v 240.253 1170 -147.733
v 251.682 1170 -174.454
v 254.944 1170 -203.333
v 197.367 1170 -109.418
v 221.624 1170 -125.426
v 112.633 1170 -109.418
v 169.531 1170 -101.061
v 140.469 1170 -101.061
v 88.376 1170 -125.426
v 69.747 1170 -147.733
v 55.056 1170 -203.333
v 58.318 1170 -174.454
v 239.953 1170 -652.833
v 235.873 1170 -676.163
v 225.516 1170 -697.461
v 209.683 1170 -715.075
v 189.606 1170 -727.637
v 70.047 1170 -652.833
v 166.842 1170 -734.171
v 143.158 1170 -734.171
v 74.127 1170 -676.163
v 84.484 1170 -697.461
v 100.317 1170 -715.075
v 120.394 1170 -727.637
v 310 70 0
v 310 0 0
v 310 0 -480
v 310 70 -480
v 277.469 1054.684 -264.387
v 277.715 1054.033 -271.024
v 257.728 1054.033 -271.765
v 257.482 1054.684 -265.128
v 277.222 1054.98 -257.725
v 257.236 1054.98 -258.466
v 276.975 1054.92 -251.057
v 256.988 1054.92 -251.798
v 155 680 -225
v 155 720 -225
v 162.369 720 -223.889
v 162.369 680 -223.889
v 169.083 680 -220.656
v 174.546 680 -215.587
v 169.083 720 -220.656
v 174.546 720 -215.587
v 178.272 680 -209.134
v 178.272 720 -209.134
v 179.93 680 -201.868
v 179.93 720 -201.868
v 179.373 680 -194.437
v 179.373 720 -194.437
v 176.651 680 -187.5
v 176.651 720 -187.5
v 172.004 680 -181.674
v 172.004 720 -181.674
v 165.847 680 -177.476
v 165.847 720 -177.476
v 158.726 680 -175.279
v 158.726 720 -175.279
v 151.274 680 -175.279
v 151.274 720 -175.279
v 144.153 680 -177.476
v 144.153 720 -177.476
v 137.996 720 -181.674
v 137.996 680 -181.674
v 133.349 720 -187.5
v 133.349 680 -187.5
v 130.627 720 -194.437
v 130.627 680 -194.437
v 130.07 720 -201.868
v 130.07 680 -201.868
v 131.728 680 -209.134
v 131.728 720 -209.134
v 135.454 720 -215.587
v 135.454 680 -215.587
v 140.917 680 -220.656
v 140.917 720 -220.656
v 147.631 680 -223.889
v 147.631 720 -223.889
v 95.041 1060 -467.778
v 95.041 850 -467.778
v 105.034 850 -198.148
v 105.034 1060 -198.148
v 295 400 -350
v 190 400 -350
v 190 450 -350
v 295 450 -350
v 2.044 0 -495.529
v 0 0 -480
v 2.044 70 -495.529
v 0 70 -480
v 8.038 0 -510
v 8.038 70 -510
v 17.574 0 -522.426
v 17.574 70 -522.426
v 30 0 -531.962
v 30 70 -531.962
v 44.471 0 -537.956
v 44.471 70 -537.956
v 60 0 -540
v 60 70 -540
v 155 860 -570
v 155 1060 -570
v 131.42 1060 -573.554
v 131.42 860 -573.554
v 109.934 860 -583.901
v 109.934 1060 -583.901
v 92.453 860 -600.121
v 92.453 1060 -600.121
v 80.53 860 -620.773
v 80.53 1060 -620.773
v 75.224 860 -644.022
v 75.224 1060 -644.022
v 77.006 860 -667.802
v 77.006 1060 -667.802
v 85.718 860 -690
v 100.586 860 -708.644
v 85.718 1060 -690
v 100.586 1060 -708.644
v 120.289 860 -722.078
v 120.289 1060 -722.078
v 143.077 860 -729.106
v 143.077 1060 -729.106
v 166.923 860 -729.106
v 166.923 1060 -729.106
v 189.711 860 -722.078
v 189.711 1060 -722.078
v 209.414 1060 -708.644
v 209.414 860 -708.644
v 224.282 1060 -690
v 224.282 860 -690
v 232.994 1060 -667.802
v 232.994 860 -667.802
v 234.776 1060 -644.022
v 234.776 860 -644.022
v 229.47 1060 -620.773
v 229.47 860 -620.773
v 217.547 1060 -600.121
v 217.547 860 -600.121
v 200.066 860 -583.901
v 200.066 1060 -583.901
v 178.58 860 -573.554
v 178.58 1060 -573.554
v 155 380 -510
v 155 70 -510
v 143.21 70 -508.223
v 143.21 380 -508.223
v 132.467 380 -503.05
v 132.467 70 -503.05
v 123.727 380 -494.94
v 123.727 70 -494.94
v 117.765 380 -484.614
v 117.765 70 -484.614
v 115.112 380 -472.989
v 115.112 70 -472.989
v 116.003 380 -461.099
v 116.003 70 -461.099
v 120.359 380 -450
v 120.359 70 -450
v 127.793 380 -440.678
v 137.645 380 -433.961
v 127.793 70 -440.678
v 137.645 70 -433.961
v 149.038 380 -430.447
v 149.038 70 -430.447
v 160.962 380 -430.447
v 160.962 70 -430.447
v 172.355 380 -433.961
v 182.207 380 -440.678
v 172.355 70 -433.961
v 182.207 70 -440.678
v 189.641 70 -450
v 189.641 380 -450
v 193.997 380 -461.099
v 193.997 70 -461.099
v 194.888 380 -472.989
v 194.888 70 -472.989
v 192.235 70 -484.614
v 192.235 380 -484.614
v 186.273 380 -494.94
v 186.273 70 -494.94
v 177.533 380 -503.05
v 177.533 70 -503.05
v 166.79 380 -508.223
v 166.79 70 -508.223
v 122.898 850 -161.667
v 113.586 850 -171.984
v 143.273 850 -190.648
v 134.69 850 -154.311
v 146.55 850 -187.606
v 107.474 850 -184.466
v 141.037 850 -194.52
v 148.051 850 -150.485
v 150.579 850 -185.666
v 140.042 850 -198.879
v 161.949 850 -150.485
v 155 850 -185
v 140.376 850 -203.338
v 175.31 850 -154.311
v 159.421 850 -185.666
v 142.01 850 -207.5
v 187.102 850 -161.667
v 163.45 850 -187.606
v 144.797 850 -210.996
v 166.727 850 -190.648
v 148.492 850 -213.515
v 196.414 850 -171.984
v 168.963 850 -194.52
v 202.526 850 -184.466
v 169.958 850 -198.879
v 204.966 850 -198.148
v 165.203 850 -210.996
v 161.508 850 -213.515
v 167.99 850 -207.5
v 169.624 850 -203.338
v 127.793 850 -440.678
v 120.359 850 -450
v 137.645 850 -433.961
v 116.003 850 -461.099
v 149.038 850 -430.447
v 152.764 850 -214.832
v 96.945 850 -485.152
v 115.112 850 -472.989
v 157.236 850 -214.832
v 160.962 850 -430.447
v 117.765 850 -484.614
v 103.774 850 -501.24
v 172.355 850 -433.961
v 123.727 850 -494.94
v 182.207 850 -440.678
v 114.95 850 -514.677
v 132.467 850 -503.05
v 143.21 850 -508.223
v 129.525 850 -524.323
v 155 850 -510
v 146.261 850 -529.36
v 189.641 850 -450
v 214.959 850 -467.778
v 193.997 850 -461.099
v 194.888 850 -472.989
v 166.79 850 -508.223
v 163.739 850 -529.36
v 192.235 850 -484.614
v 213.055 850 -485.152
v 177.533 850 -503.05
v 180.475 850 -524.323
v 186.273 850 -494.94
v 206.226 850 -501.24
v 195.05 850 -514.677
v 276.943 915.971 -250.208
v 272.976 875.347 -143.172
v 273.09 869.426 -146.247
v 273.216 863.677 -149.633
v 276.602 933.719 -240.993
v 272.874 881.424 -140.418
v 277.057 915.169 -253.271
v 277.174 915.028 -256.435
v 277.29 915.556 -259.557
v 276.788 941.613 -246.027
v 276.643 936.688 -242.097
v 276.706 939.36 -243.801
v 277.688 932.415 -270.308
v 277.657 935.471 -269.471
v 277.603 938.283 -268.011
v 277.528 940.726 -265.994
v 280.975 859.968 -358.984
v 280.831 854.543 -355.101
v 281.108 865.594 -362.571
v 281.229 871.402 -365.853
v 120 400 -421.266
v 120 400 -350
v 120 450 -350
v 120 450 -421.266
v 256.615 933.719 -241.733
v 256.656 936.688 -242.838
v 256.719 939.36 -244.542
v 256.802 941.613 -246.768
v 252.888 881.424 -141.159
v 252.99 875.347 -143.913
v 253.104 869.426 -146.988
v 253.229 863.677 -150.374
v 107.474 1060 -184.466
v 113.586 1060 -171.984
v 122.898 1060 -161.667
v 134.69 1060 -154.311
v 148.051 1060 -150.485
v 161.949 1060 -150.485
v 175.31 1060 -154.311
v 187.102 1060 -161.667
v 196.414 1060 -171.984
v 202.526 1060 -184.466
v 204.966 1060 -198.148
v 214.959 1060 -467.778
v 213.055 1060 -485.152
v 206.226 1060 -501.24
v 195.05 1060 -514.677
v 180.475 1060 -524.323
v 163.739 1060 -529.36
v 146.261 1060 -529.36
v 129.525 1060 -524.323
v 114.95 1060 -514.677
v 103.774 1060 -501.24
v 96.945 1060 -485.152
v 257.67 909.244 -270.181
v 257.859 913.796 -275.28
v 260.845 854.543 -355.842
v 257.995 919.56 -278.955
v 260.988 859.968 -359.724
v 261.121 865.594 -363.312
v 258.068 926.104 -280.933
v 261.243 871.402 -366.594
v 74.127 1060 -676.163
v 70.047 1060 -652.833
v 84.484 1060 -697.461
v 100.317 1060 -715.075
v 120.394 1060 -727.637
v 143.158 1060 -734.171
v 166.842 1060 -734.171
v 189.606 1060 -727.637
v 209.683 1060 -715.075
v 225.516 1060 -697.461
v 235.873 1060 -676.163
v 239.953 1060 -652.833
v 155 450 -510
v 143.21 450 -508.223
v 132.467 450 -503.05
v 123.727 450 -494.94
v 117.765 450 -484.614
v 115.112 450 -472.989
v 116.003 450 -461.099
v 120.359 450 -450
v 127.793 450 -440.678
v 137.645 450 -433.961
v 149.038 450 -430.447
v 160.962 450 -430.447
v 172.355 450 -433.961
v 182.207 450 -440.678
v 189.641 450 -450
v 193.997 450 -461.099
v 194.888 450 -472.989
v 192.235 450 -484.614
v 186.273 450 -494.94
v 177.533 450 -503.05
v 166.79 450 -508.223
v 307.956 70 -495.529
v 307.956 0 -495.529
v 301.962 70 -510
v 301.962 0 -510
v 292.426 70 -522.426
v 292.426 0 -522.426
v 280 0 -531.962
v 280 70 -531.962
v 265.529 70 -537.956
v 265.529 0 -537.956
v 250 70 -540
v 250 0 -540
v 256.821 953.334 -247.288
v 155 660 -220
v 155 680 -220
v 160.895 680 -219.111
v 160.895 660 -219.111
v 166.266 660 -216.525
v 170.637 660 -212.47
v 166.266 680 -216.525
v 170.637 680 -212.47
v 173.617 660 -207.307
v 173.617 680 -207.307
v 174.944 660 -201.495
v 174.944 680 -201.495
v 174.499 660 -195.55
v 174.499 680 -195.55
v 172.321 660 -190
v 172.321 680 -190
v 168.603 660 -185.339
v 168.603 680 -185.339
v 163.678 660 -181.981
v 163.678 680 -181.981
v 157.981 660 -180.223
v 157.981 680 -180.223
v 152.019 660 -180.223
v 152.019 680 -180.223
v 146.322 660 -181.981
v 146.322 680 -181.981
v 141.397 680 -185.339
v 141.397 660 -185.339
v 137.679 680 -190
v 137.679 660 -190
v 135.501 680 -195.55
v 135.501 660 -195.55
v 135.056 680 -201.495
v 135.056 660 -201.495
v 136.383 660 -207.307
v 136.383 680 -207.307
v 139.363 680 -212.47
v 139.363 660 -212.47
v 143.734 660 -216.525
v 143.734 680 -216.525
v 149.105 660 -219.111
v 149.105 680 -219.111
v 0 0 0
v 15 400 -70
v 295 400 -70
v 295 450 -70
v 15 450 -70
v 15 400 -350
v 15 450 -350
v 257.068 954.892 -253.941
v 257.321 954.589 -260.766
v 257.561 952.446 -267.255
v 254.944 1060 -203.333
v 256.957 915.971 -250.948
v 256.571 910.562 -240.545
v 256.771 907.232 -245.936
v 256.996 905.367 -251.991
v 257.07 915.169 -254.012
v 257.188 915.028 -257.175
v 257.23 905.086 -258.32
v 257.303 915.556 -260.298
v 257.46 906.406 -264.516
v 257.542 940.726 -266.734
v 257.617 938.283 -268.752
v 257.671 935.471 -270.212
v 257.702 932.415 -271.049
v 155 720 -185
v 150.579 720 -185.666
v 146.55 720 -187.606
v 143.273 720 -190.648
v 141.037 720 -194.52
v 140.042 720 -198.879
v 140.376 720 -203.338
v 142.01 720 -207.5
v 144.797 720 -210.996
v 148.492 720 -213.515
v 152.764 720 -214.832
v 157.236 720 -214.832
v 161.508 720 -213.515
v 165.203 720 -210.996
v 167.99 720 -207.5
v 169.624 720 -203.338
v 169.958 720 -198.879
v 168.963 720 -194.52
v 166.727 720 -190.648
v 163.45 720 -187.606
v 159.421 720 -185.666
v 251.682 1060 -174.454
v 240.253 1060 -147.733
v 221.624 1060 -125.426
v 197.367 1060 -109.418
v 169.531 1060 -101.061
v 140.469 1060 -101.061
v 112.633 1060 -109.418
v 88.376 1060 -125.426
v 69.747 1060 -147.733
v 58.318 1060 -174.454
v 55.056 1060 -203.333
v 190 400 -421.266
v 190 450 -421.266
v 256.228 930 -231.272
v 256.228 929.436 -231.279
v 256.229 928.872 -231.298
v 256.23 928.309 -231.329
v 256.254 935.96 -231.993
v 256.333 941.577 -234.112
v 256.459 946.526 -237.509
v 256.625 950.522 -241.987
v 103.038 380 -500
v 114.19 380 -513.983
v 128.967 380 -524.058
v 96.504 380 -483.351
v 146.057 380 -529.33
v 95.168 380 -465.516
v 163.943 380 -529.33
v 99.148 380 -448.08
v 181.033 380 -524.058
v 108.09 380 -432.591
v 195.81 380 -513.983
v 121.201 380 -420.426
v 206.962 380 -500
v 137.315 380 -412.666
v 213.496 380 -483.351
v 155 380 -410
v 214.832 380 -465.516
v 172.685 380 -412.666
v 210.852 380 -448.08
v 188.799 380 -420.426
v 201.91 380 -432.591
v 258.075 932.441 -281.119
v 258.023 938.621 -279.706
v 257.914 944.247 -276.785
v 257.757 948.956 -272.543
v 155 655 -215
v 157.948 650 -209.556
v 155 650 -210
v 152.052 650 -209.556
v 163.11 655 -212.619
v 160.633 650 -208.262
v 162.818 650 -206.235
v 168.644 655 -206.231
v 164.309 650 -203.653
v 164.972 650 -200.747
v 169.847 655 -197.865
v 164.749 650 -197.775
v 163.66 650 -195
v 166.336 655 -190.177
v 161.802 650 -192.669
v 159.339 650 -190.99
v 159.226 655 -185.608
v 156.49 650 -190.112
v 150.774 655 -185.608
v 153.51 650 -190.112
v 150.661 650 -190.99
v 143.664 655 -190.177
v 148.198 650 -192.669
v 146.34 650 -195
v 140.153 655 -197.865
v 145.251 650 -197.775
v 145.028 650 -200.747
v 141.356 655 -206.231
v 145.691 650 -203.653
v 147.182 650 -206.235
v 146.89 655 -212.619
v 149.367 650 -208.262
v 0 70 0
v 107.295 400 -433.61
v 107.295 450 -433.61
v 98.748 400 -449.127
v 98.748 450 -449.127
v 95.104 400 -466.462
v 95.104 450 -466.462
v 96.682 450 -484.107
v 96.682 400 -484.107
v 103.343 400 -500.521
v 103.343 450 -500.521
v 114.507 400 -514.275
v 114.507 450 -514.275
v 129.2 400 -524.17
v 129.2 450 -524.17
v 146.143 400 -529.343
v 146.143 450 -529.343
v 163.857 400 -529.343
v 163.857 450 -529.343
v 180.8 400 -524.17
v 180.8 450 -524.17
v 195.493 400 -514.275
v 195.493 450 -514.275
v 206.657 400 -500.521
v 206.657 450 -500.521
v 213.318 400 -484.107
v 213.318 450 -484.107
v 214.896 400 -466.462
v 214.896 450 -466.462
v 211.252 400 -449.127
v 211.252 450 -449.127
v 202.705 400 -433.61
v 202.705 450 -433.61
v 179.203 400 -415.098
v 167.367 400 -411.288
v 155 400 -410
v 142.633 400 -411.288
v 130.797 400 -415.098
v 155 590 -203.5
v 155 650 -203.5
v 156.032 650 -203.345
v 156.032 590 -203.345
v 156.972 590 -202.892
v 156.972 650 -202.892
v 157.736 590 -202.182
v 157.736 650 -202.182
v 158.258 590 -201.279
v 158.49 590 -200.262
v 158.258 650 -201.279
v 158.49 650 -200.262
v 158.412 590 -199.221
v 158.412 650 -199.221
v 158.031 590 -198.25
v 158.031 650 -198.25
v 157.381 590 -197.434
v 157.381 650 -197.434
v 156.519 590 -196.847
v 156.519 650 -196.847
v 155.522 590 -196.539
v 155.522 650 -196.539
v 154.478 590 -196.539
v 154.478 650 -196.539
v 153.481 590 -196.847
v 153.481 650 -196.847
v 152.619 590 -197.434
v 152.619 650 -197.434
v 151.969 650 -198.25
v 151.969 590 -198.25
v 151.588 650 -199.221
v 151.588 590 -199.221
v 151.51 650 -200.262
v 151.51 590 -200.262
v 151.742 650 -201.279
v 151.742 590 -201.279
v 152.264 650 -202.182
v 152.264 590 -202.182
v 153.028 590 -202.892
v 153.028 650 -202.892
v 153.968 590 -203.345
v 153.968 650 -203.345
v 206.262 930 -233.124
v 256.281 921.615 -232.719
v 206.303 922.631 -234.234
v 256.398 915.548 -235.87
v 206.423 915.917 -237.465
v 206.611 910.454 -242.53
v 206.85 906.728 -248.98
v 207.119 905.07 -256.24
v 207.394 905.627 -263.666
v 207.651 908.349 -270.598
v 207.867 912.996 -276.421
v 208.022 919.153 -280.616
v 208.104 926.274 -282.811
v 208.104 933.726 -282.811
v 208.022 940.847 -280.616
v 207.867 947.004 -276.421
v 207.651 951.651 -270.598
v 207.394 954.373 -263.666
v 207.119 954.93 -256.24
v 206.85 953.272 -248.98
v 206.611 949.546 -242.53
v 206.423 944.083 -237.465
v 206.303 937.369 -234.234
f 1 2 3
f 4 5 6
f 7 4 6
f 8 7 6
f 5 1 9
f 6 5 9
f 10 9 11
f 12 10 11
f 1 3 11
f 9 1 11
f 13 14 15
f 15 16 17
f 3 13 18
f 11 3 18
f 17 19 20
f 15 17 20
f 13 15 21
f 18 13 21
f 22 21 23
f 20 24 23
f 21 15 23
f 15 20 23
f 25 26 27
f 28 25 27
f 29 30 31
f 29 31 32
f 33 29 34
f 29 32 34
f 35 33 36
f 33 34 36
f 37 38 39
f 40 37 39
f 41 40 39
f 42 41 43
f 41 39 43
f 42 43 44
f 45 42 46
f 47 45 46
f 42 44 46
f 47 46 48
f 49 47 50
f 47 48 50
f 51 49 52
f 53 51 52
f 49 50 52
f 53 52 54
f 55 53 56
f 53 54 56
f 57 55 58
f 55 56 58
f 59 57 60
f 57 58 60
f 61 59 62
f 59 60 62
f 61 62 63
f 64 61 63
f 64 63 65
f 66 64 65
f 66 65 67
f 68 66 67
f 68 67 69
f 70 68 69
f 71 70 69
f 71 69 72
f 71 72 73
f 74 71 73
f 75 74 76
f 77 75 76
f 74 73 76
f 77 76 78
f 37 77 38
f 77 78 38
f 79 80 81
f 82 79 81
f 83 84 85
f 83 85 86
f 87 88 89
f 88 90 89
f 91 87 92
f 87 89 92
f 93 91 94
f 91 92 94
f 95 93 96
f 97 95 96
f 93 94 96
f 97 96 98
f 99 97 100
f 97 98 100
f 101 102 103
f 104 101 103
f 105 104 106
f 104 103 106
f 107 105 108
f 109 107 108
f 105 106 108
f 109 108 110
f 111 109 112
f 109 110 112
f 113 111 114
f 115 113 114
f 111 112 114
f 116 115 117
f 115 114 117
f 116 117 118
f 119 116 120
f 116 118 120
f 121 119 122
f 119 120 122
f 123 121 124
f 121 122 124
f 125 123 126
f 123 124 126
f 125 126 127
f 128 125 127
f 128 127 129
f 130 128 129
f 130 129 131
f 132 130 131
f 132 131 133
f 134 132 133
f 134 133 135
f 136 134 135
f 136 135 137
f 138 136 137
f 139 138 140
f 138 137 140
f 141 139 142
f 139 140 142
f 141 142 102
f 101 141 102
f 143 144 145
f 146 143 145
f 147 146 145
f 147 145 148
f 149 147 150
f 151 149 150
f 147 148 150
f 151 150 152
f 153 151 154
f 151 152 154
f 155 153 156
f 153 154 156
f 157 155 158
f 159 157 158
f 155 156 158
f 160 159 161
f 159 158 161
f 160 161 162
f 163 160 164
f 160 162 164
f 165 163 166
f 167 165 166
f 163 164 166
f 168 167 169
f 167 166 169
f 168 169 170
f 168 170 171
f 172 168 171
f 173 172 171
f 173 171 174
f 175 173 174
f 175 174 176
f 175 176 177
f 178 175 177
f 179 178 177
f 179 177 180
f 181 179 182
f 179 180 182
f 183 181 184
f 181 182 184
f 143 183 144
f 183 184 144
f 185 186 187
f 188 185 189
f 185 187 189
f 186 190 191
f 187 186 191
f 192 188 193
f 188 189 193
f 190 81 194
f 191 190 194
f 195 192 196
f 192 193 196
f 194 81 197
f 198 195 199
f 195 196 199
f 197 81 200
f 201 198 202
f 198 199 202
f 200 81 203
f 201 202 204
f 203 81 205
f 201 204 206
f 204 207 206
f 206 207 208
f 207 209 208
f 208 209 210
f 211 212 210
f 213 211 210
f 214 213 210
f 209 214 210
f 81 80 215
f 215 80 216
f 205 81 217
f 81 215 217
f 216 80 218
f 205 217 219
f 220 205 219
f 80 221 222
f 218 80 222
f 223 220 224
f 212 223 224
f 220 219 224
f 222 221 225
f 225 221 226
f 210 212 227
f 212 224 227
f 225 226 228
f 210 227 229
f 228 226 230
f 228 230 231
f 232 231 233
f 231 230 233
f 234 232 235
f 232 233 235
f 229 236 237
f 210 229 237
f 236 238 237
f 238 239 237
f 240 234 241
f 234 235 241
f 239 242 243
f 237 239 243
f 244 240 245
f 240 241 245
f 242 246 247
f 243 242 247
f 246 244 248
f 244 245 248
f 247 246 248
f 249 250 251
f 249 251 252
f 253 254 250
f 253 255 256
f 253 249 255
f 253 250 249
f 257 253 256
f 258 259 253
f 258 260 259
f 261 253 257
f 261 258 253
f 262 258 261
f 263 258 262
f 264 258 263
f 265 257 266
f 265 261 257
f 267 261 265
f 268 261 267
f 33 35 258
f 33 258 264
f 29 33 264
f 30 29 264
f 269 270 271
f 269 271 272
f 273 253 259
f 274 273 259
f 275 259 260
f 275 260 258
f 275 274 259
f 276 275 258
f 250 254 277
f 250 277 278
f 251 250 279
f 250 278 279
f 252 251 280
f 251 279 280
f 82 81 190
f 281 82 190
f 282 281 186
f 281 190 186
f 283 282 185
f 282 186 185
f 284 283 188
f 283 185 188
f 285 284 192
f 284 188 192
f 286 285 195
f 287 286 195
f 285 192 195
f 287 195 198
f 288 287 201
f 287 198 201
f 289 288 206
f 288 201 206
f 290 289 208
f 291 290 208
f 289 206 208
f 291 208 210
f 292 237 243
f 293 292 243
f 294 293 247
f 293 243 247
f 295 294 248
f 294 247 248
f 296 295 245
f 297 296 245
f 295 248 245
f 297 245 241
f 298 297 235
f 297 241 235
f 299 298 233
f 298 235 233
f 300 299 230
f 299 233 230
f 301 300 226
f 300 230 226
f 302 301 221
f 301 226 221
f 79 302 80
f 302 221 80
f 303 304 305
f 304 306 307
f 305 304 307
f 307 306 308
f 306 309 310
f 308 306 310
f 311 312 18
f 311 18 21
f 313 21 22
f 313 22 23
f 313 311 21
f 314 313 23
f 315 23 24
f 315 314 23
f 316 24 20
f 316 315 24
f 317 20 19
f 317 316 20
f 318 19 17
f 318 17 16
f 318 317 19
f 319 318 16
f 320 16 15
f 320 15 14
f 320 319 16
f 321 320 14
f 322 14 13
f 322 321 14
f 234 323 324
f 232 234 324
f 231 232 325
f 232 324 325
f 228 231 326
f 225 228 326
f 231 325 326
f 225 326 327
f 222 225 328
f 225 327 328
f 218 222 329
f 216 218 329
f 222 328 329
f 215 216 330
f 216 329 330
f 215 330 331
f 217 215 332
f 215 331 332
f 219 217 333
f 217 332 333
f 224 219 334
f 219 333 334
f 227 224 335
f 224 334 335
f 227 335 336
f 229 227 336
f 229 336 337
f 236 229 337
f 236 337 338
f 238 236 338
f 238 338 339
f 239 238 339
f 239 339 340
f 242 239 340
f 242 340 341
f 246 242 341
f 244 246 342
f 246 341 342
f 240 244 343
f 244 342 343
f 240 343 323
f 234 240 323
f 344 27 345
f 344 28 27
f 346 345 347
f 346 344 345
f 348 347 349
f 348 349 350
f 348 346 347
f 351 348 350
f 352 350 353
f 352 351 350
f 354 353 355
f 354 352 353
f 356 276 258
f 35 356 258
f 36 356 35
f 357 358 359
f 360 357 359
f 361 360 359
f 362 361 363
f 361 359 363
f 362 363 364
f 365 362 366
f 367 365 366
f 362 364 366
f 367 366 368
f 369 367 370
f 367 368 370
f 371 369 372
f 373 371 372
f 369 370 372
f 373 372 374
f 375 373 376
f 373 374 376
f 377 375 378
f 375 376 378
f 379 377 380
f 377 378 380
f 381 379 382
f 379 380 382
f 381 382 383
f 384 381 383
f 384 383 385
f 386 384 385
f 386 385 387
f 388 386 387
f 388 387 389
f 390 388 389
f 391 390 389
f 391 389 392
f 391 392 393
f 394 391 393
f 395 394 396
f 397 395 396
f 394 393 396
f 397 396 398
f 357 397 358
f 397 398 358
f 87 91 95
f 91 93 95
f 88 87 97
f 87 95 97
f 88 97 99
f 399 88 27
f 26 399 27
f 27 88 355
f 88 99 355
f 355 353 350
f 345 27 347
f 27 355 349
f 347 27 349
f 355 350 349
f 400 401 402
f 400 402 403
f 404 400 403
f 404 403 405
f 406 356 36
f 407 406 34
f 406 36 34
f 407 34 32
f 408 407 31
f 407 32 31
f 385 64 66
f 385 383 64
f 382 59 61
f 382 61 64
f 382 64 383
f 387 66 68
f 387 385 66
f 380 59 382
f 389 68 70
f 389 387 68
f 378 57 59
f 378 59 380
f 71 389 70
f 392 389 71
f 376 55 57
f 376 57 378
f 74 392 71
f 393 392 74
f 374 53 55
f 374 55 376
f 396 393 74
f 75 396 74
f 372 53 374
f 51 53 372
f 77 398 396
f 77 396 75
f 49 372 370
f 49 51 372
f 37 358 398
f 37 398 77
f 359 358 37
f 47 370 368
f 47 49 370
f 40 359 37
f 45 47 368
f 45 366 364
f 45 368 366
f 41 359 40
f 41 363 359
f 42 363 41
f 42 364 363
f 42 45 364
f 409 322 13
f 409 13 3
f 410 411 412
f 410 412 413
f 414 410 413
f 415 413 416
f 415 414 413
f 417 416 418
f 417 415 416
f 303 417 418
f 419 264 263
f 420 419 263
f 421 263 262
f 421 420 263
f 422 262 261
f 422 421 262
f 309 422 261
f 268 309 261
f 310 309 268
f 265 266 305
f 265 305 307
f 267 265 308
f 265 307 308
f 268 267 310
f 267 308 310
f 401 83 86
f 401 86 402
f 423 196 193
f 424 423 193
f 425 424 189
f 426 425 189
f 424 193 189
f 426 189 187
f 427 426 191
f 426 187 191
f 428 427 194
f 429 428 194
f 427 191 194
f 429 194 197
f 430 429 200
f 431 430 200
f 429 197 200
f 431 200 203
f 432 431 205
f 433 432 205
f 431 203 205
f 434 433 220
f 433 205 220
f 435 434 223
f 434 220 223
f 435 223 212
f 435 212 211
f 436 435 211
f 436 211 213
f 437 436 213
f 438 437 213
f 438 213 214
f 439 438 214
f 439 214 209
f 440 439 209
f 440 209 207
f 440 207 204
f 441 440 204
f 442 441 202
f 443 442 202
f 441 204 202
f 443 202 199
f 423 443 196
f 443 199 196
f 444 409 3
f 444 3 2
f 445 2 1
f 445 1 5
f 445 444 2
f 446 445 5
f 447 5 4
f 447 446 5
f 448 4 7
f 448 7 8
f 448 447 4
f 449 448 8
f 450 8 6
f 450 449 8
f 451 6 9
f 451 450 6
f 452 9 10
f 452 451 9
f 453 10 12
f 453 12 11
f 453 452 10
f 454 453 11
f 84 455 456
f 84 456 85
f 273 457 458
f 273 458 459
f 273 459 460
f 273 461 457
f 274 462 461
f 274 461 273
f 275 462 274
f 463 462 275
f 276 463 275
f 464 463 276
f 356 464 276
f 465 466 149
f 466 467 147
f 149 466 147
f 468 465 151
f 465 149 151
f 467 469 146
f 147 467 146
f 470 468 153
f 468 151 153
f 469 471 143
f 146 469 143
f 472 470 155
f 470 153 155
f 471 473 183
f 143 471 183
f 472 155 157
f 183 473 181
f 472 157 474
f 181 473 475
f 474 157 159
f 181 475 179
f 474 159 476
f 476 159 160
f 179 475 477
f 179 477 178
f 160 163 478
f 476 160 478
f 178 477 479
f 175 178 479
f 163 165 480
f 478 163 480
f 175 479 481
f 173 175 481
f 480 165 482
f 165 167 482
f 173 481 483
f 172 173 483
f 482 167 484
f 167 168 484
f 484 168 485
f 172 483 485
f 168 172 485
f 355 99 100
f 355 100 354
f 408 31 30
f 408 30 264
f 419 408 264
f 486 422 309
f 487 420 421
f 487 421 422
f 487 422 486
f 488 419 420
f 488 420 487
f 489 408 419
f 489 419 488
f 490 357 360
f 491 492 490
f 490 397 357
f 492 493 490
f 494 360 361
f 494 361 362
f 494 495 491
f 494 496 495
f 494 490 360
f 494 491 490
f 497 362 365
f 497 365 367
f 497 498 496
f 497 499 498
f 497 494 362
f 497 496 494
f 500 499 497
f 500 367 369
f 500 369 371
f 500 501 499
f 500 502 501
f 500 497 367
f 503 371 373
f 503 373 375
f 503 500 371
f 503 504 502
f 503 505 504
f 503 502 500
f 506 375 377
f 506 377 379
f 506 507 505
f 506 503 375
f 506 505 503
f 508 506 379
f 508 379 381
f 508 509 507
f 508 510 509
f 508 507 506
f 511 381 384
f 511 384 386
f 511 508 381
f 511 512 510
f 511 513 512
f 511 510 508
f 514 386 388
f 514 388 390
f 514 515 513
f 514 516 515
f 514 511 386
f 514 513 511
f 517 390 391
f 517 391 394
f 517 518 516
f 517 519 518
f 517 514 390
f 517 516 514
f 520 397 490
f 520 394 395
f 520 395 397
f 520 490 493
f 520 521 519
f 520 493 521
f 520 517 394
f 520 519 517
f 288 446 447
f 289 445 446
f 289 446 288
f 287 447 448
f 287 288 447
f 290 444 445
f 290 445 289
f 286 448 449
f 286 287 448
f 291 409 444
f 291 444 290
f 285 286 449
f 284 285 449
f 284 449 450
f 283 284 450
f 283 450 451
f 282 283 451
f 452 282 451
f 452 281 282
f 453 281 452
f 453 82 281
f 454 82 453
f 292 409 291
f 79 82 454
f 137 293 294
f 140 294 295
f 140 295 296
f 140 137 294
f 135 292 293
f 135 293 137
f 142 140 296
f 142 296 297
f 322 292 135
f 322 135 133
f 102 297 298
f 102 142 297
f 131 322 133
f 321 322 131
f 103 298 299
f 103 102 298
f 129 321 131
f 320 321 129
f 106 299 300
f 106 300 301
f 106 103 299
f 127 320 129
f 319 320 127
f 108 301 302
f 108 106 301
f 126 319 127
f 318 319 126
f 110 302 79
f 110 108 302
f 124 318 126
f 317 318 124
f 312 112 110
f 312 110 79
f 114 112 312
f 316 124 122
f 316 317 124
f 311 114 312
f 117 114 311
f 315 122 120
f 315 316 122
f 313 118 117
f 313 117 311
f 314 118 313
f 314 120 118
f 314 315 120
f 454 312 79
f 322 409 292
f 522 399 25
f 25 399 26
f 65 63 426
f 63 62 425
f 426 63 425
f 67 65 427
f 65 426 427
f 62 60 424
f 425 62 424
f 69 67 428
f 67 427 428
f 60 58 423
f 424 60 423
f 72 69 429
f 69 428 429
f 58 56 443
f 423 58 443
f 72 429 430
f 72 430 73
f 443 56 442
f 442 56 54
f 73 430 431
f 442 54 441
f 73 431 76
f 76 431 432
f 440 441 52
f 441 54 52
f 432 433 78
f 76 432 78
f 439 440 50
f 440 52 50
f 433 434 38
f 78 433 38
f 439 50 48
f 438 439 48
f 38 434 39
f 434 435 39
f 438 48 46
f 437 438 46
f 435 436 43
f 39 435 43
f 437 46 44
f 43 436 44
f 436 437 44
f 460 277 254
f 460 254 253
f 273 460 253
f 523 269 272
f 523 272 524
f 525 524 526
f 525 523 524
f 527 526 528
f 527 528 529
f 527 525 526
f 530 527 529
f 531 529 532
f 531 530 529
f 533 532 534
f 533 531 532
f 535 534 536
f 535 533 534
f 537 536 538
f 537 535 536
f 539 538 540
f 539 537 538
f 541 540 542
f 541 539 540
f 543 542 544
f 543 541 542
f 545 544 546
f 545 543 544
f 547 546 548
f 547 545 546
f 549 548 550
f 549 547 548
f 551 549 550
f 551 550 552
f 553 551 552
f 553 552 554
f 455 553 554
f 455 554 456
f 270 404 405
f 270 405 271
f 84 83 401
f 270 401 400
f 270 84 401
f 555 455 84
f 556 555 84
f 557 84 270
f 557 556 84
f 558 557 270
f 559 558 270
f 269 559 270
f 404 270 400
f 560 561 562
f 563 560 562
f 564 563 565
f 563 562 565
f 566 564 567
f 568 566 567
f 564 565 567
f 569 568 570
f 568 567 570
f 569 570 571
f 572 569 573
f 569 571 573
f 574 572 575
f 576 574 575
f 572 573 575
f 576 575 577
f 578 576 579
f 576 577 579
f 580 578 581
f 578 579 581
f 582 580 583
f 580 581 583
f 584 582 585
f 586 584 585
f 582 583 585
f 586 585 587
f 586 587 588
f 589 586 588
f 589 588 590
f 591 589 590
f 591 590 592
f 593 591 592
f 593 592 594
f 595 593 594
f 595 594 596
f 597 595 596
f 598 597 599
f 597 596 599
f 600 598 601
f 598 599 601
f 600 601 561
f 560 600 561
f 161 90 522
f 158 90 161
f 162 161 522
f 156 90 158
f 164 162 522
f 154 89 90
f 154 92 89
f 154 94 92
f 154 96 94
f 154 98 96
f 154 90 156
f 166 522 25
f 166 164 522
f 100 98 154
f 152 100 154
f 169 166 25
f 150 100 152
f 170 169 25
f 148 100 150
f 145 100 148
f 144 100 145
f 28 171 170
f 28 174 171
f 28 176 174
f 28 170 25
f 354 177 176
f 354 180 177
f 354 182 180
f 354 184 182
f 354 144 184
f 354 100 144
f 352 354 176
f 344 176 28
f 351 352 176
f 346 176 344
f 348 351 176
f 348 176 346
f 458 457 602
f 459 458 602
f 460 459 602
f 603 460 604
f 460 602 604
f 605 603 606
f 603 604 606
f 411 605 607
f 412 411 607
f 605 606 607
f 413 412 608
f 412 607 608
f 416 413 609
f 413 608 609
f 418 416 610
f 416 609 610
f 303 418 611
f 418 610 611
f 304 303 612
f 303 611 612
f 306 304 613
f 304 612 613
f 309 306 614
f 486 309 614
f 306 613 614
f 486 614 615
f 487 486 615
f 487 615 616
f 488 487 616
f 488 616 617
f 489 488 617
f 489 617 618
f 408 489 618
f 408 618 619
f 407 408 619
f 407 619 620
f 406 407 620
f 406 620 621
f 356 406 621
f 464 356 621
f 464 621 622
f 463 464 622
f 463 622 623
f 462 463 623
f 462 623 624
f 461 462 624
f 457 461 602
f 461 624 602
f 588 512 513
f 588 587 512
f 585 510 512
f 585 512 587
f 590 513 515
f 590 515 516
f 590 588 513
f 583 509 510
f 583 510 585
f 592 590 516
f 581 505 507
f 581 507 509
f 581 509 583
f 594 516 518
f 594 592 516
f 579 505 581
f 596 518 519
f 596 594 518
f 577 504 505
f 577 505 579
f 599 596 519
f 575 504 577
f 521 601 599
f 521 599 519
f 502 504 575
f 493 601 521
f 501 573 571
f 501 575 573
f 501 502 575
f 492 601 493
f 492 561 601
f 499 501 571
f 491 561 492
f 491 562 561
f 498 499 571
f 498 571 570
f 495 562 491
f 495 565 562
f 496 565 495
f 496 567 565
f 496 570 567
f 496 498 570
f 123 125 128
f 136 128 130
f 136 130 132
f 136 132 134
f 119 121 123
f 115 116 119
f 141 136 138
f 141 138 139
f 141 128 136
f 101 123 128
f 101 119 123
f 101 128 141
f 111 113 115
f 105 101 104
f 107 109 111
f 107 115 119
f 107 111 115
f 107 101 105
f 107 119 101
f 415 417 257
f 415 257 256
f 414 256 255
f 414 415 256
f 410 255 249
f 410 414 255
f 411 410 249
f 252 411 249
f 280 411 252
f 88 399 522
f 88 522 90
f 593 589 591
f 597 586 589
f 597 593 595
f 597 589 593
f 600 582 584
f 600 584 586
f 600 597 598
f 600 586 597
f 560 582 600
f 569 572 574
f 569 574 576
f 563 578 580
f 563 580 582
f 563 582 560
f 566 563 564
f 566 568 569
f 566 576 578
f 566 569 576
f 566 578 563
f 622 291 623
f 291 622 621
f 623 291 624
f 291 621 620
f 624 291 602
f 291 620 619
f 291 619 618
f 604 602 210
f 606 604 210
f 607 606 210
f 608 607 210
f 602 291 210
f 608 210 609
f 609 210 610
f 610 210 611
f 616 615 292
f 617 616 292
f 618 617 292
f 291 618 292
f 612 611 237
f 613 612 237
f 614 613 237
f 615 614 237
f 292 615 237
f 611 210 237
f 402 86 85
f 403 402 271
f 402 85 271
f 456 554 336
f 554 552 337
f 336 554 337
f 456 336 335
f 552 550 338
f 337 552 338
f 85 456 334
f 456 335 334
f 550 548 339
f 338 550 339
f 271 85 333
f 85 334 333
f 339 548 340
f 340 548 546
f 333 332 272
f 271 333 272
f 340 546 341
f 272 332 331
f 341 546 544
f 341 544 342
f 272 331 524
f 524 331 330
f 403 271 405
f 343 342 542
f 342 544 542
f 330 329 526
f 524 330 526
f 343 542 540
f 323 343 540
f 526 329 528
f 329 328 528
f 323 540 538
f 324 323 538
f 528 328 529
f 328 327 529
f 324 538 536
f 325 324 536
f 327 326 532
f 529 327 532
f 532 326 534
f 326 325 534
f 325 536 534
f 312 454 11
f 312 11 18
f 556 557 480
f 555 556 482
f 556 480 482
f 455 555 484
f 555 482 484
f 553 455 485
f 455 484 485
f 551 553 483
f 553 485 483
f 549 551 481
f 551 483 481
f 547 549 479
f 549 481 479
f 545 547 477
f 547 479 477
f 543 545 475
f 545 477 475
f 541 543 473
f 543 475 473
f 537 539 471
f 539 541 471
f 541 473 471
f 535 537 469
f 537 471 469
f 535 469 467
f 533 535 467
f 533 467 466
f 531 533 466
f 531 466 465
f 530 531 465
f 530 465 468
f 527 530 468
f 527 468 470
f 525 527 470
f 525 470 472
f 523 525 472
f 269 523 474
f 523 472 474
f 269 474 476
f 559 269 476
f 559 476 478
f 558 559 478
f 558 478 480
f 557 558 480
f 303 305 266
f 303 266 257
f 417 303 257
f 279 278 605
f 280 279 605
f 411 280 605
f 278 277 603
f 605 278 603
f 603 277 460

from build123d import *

# Parameters (mm, degrees)
SKETCH_1_W          = 310
SKETCH_1_H          = 540
EXTRUDE_1_DEPTH     = 70
FILLET_1_R          = 60
SKETCH_2_R          = 40
EXTRUDE_2_DEPTH     = 310
SKETCH_3_R          = 60
EXTRUDE_3_DEPTH     = 20
EXTRUDE_4_DEPTH     = 50
SKETCH_5_R          = 40
EXTRUDE_5_DEPTH     = 400
EXTRUDE_6_DEPTH     = 210
EXTRUDE_7_DEPTH     = 110
SKETCH_10_R         = 80
EXTRUDE_8_DEPTH     = 200
SKETCH_11_R         = 15
EXTRUDE_9_DEPTH     = 130
SKETCH_12_R         = 25
EXTRUDE_10_DEPTH    = 40
SKETCH_13_R         = 20
EXTRUDE_11_DEPTH    = 30
CHAMFER_1_SIZE      = 10
SKETCH_14_R         = 3.5
EXTRUDE_12_DEPTH    = 60
SKETCH_15_R         = 25
EXTRUDE_13_DEPTH    = 50
SKETCH_16_R         = 125
EXTRUDE_14_DEPTH    = 20
CUT_EXTRUDE_START   = -20
CUT_EXTRUDE_1_DEPTH = 20


with BuildPart() as part:
    # ｽｹｯﾁ1 → ﾎﾞｽ - 押し出し1 (new body)
    with BuildSketch(Plane(origin=(0, 0, 0), x_dir=(1, 0, 0), z_dir=(0, 1, 0))):
        with Locations((155, 270)):
            Rectangle(SKETCH_1_W, SKETCH_1_H)
    extrude(amount=EXTRUDE_1_DEPTH)

    # ﾌｨﾚｯﾄ1
    fillet_1_edges = [part.edges().sort_by_distance(p)[0] for p in [
        (0, 35, -540),
        (310, 35, -540),
    ]]
    fillet(fillet_1_edges, radius=FILLET_1_R)

    # ｽｹｯﾁ2 → ﾎﾞｽ - 押し出し2 (add)
    with BuildSketch(Plane(origin=(0, 70, 0), x_dir=(1, 0, 0), z_dir=(0, 1, 0))):
        with Locations(Location((155, 470, 0), (0, 0, 90))):
            Circle(SKETCH_2_R)
    extrude(amount=EXTRUDE_2_DEPTH)

    # ｽｹｯﾁ3 → ﾎﾞｽ - 押し出し3 (add)
    with BuildSketch(Plane(origin=(0, 380, 0), x_dir=(1, 0, 0), z_dir=(0, 1, 0))):
        with Locations(Location((155, 470, 0), (0, 0, 270))):
            Circle(SKETCH_3_R)
    extrude(amount=EXTRUDE_3_DEPTH)

    # ｽｹｯﾁ4 → ﾎﾞｽ - 押し出し4 (add)
    with BuildSketch(Plane(origin=(0, 400, 0), x_dir=(1, 0, 0), z_dir=(0, 1, 0))):
        with BuildLine():
            Line((190, 350), (295, 350))
            Line((295, 350), (295, 70))
            Line((295, 70), (15, 70))
            Line((15, 70), (15, 350))
            Line((15, 350), (120, 350))
            Line((120, 350), (120, 421.266028276))
            ThreePointArc((120, 421.266028276), (155, 530), (190, 421.266028276))
            Line((190, 421.266028276), (190, 350))
        make_face()
    extrude(amount=EXTRUDE_4_DEPTH)

    # ｽｹｯﾁ5 → ﾎﾞｽ - 押し出し5 (add)
    with BuildSketch(Plane(origin=(0, 450, 0), x_dir=(1, 0, 0), z_dir=(0, 1, 0))):
        with Locations(Location((155, 470, 0), (0, 0, 90))):
            Circle(SKETCH_5_R)
    extrude(amount=EXTRUDE_5_DEPTH)

    # ｽｹｯﾁ8 → ﾎﾞｽ - 押し出し6 (add)
    with BuildSketch(Plane(origin=(0, 850, 0), x_dir=(1, 0, 0), z_dir=(0, 1, 0))):
        with BuildLine():
            Line((95.041166386, 467.777777778), (105.034305321, 198.148148148))
            ThreePointArc((105.034305321, 198.148148148), (155, 150), (204.965694679, 198.148148148))
            Line((204.965694679, 198.148148148), (214.958833614, 467.777777778))
            ThreePointArc((214.958833614, 467.777777778), (155, 530), (95.041166386, 467.777777778))
        make_face()
    extrude(amount=EXTRUDE_6_DEPTH)

    # ｽｹｯﾁ9 → ﾎﾞｽ - 押し出し7 (add)
    with BuildSketch(Plane(origin=(0, 1060, 0), x_dir=(1, 0, 0), z_dir=(0, 1, 0))):
        with BuildLine():
            Line((55.055570996, 203.333333333), (70.047235347, 652.833333333))
            ThreePointArc((70.047235347, 652.833333333), (155, 735), (239.952764653, 652.833333333))
            Line((239.952764653, 652.833333333), (254.944429004, 203.333333333))
            ThreePointArc((254.944429004, 203.333333333), (155, 100), (55.055570996, 203.333333333))
        make_face()
    extrude(amount=EXTRUDE_7_DEPTH)

    # ｽｹｯﾁ10 → ﾎﾞｽ - 押し出し8 (add)
    with BuildSketch(Plane(origin=(0, 1060, 0), x_dir=(-1, 0, 0), z_dir=(0, -1, 0))):
        with Locations(Location((-155, 650, 0), (0, 0, 270))):
            Circle(SKETCH_10_R)
    extrude(amount=EXTRUDE_8_DEPTH)

    # ｽｹｯﾁ11 → ﾎﾞｽ - 押し出し9 (add)
    with BuildSketch(Plane(origin=(0, 850, 0), x_dir=(-1, 0, 0), z_dir=(0, -1, 0))):
        with Locations(Location((-155, 200, 0), (0, 0, 270))):
            Circle(SKETCH_11_R)
    extrude(amount=EXTRUDE_9_DEPTH)

    # ｽｹｯﾁ12 → ﾎﾞｽ - 押し出し10 (add)
    with BuildSketch(Plane(origin=(0, 720, 0), x_dir=(-1, 0, 0), z_dir=(0, -1, 0))):
        with Locations(Location((-155, 200, 0), (0, 0, 90))):
            Circle(SKETCH_12_R)
    extrude(amount=EXTRUDE_10_DEPTH)

    # ｽｹｯﾁ13 → ﾎﾞｽ - 押し出し11 (add)
    with BuildSketch(Plane(origin=(0, 680, 0), x_dir=(-1, 0, 0), z_dir=(0, -1, 0))):
        with Locations(Location((-155, 200, 0), (0, 0, 90))):
            Circle(SKETCH_13_R)
    extrude(amount=EXTRUDE_11_DEPTH)

    # 面取り1
    chamfer_1_edges = [part.edges().sort_by_distance(p)[0] for p in [
        (155, 650, -180),
    ]]
    chamfer(chamfer_1_edges, length=CHAMFER_1_SIZE)

    # ｽｹｯﾁ14 → ﾎﾞｽ - 押し出し12 (add)
    with BuildSketch(Plane(origin=(0, 650, 0), x_dir=(-1, 0, 0), z_dir=(0, -1, 0))):
        with Locations(Location((-155, 200, 0), (0, 0, 90))):
            Circle(SKETCH_14_R)
    extrude(amount=EXTRUDE_12_DEPTH)

    # ｽｹｯﾁ15 → ﾎﾞｽ - 押し出し13 (add)
    with BuildSketch(Plane(origin=(197.350749514, 0, 7.314305411), x_dir=(0.0370370370370371, 0, -0.9993138935727439), z_dir=(0.9993138935727439, 0, 0.0370370370370371))):
        with Locations(Location((265.603519455, 930, 0), (0, 0, 180))):
            Circle(SKETCH_15_R)
    extrude(amount=EXTRUDE_13_DEPTH)

    # ｽｹｯﾁ16 → ﾎﾞｽ - 押し出し14 (add)
    with BuildSketch(Plane(origin=(247.316444192, 0, 9.166157263), x_dir=(0.03703703703703711, 0, -0.9993138935727439), z_dir=(0.9993138935727439, 0, 0.03703703703703711))):
        with Locations((265.603519455, 930)):
            Circle(SKETCH_16_R)
    extrude(amount=EXTRUDE_14_DEPTH)

    # ｽｹｯﾁ17 → ｶｯﾄ - 押し出し1 (cut)
    with BuildSketch(Plane(origin=(267.302722064, 0, 9.906898004), x_dir=(0.037037037037037125, 0, -0.9993138935727439), z_dir=(0.9993138935727439, 0, 0.037037037037037125)).offset(CUT_EXTRUDE_START)):
        with BuildLine():
            Line((150.427943116, 881.424423678), (251.071784865, 933.718694636))
            ThreePointArc((251.071784865, 933.718694636), (252.958803035, 938.069147828), (256.109578031, 941.613142393))
            Line((256.109578031, 941.613142393), (261.143331784, 1054.92040156))
            ThreePointArc((261.143331784, 1054.92040156), (160.230882623, 997.242898563), (150.427943116, 881.424423678))
        make_face()
        with BuildLine():
            ThreePointArc((390.603519455, 930), (359.318547956, 1012.719365526), (281.123624526, 1054.032763166))
            Line((281.123624526, 1054.032763166), (276.089870774, 940.725503999))
            ThreePointArc((276.089870774, 940.725503999), (278.913964671, 936.916071729), (280.407766497, 932.415423259))
            Line((280.407766497, 932.415423259), (376.017854493, 871.402435049))
            ThreePointArc((376.017854493, 871.402435049), (386.90230733, 899.80721841), (390.603519455, 930))
        make_face()
        with BuildLine():
            Line((260.293213837, 915.971434348), (159.649372089, 863.677163391))
            ThreePointArc((159.649372089, 863.677163391), (260.055779492, 805.123170359), (365.258990723, 854.542813156))
            Line((365.258990723, 854.542813156), (269.648902727, 915.555801366))
            ThreePointArc((269.648902727, 915.555801366), (264.93779066, 915.014780443), (260.293213837, 915.971434348))
        make_face()
    extrude(amount=CUT_EXTRUDE_1_DEPTH, mode=Mode.SUBTRACT)


solid = part.part
